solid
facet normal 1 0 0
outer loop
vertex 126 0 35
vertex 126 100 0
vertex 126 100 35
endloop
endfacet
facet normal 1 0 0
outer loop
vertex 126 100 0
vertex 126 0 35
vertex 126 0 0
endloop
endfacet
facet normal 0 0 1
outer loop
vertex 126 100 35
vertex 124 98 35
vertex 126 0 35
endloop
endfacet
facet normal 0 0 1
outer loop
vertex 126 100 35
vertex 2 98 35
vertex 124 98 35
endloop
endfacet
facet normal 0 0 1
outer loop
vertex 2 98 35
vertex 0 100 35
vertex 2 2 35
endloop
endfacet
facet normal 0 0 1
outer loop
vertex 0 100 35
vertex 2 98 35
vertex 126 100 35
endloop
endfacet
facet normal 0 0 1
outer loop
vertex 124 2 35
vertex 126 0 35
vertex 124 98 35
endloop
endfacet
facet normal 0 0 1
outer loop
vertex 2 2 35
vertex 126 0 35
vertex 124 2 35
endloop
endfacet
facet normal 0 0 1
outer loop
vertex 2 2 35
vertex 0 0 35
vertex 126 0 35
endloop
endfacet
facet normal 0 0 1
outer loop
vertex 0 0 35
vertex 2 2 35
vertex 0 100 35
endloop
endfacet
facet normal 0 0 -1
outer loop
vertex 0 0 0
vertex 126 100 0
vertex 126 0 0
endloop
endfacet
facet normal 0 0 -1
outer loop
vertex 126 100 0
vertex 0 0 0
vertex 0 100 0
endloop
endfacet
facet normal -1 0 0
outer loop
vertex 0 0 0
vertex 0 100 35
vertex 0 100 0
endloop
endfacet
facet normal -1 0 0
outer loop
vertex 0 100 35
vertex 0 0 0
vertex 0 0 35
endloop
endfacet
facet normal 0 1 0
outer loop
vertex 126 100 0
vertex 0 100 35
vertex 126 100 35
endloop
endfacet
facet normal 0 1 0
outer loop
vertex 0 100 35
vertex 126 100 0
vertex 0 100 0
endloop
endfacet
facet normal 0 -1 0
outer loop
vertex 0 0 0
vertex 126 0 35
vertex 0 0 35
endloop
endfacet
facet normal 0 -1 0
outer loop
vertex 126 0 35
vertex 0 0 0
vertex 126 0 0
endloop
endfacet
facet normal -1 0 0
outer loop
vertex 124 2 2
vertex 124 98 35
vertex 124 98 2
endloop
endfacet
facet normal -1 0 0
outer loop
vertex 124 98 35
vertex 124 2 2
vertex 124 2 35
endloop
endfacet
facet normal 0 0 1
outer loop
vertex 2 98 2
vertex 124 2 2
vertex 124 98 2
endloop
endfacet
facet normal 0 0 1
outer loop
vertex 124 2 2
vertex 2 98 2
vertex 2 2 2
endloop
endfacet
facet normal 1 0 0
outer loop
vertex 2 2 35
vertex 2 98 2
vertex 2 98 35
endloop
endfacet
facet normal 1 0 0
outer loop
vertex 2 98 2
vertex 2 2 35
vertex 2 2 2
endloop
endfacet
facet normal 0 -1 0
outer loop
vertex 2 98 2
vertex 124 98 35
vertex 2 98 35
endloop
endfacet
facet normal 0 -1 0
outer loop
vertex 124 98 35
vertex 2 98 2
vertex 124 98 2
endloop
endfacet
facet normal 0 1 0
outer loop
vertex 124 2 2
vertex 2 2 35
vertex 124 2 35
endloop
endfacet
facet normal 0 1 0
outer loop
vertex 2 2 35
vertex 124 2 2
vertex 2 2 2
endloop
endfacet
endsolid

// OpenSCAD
difference(){
	union(){ 

        translate([0,0,0]){
           cube([58+58+10,100,35], center=false);
        }
        

	}
	union() {
        translate([2,2,2]){
           cube([58+58+6,96,99], center=false);
        }
	}
}
